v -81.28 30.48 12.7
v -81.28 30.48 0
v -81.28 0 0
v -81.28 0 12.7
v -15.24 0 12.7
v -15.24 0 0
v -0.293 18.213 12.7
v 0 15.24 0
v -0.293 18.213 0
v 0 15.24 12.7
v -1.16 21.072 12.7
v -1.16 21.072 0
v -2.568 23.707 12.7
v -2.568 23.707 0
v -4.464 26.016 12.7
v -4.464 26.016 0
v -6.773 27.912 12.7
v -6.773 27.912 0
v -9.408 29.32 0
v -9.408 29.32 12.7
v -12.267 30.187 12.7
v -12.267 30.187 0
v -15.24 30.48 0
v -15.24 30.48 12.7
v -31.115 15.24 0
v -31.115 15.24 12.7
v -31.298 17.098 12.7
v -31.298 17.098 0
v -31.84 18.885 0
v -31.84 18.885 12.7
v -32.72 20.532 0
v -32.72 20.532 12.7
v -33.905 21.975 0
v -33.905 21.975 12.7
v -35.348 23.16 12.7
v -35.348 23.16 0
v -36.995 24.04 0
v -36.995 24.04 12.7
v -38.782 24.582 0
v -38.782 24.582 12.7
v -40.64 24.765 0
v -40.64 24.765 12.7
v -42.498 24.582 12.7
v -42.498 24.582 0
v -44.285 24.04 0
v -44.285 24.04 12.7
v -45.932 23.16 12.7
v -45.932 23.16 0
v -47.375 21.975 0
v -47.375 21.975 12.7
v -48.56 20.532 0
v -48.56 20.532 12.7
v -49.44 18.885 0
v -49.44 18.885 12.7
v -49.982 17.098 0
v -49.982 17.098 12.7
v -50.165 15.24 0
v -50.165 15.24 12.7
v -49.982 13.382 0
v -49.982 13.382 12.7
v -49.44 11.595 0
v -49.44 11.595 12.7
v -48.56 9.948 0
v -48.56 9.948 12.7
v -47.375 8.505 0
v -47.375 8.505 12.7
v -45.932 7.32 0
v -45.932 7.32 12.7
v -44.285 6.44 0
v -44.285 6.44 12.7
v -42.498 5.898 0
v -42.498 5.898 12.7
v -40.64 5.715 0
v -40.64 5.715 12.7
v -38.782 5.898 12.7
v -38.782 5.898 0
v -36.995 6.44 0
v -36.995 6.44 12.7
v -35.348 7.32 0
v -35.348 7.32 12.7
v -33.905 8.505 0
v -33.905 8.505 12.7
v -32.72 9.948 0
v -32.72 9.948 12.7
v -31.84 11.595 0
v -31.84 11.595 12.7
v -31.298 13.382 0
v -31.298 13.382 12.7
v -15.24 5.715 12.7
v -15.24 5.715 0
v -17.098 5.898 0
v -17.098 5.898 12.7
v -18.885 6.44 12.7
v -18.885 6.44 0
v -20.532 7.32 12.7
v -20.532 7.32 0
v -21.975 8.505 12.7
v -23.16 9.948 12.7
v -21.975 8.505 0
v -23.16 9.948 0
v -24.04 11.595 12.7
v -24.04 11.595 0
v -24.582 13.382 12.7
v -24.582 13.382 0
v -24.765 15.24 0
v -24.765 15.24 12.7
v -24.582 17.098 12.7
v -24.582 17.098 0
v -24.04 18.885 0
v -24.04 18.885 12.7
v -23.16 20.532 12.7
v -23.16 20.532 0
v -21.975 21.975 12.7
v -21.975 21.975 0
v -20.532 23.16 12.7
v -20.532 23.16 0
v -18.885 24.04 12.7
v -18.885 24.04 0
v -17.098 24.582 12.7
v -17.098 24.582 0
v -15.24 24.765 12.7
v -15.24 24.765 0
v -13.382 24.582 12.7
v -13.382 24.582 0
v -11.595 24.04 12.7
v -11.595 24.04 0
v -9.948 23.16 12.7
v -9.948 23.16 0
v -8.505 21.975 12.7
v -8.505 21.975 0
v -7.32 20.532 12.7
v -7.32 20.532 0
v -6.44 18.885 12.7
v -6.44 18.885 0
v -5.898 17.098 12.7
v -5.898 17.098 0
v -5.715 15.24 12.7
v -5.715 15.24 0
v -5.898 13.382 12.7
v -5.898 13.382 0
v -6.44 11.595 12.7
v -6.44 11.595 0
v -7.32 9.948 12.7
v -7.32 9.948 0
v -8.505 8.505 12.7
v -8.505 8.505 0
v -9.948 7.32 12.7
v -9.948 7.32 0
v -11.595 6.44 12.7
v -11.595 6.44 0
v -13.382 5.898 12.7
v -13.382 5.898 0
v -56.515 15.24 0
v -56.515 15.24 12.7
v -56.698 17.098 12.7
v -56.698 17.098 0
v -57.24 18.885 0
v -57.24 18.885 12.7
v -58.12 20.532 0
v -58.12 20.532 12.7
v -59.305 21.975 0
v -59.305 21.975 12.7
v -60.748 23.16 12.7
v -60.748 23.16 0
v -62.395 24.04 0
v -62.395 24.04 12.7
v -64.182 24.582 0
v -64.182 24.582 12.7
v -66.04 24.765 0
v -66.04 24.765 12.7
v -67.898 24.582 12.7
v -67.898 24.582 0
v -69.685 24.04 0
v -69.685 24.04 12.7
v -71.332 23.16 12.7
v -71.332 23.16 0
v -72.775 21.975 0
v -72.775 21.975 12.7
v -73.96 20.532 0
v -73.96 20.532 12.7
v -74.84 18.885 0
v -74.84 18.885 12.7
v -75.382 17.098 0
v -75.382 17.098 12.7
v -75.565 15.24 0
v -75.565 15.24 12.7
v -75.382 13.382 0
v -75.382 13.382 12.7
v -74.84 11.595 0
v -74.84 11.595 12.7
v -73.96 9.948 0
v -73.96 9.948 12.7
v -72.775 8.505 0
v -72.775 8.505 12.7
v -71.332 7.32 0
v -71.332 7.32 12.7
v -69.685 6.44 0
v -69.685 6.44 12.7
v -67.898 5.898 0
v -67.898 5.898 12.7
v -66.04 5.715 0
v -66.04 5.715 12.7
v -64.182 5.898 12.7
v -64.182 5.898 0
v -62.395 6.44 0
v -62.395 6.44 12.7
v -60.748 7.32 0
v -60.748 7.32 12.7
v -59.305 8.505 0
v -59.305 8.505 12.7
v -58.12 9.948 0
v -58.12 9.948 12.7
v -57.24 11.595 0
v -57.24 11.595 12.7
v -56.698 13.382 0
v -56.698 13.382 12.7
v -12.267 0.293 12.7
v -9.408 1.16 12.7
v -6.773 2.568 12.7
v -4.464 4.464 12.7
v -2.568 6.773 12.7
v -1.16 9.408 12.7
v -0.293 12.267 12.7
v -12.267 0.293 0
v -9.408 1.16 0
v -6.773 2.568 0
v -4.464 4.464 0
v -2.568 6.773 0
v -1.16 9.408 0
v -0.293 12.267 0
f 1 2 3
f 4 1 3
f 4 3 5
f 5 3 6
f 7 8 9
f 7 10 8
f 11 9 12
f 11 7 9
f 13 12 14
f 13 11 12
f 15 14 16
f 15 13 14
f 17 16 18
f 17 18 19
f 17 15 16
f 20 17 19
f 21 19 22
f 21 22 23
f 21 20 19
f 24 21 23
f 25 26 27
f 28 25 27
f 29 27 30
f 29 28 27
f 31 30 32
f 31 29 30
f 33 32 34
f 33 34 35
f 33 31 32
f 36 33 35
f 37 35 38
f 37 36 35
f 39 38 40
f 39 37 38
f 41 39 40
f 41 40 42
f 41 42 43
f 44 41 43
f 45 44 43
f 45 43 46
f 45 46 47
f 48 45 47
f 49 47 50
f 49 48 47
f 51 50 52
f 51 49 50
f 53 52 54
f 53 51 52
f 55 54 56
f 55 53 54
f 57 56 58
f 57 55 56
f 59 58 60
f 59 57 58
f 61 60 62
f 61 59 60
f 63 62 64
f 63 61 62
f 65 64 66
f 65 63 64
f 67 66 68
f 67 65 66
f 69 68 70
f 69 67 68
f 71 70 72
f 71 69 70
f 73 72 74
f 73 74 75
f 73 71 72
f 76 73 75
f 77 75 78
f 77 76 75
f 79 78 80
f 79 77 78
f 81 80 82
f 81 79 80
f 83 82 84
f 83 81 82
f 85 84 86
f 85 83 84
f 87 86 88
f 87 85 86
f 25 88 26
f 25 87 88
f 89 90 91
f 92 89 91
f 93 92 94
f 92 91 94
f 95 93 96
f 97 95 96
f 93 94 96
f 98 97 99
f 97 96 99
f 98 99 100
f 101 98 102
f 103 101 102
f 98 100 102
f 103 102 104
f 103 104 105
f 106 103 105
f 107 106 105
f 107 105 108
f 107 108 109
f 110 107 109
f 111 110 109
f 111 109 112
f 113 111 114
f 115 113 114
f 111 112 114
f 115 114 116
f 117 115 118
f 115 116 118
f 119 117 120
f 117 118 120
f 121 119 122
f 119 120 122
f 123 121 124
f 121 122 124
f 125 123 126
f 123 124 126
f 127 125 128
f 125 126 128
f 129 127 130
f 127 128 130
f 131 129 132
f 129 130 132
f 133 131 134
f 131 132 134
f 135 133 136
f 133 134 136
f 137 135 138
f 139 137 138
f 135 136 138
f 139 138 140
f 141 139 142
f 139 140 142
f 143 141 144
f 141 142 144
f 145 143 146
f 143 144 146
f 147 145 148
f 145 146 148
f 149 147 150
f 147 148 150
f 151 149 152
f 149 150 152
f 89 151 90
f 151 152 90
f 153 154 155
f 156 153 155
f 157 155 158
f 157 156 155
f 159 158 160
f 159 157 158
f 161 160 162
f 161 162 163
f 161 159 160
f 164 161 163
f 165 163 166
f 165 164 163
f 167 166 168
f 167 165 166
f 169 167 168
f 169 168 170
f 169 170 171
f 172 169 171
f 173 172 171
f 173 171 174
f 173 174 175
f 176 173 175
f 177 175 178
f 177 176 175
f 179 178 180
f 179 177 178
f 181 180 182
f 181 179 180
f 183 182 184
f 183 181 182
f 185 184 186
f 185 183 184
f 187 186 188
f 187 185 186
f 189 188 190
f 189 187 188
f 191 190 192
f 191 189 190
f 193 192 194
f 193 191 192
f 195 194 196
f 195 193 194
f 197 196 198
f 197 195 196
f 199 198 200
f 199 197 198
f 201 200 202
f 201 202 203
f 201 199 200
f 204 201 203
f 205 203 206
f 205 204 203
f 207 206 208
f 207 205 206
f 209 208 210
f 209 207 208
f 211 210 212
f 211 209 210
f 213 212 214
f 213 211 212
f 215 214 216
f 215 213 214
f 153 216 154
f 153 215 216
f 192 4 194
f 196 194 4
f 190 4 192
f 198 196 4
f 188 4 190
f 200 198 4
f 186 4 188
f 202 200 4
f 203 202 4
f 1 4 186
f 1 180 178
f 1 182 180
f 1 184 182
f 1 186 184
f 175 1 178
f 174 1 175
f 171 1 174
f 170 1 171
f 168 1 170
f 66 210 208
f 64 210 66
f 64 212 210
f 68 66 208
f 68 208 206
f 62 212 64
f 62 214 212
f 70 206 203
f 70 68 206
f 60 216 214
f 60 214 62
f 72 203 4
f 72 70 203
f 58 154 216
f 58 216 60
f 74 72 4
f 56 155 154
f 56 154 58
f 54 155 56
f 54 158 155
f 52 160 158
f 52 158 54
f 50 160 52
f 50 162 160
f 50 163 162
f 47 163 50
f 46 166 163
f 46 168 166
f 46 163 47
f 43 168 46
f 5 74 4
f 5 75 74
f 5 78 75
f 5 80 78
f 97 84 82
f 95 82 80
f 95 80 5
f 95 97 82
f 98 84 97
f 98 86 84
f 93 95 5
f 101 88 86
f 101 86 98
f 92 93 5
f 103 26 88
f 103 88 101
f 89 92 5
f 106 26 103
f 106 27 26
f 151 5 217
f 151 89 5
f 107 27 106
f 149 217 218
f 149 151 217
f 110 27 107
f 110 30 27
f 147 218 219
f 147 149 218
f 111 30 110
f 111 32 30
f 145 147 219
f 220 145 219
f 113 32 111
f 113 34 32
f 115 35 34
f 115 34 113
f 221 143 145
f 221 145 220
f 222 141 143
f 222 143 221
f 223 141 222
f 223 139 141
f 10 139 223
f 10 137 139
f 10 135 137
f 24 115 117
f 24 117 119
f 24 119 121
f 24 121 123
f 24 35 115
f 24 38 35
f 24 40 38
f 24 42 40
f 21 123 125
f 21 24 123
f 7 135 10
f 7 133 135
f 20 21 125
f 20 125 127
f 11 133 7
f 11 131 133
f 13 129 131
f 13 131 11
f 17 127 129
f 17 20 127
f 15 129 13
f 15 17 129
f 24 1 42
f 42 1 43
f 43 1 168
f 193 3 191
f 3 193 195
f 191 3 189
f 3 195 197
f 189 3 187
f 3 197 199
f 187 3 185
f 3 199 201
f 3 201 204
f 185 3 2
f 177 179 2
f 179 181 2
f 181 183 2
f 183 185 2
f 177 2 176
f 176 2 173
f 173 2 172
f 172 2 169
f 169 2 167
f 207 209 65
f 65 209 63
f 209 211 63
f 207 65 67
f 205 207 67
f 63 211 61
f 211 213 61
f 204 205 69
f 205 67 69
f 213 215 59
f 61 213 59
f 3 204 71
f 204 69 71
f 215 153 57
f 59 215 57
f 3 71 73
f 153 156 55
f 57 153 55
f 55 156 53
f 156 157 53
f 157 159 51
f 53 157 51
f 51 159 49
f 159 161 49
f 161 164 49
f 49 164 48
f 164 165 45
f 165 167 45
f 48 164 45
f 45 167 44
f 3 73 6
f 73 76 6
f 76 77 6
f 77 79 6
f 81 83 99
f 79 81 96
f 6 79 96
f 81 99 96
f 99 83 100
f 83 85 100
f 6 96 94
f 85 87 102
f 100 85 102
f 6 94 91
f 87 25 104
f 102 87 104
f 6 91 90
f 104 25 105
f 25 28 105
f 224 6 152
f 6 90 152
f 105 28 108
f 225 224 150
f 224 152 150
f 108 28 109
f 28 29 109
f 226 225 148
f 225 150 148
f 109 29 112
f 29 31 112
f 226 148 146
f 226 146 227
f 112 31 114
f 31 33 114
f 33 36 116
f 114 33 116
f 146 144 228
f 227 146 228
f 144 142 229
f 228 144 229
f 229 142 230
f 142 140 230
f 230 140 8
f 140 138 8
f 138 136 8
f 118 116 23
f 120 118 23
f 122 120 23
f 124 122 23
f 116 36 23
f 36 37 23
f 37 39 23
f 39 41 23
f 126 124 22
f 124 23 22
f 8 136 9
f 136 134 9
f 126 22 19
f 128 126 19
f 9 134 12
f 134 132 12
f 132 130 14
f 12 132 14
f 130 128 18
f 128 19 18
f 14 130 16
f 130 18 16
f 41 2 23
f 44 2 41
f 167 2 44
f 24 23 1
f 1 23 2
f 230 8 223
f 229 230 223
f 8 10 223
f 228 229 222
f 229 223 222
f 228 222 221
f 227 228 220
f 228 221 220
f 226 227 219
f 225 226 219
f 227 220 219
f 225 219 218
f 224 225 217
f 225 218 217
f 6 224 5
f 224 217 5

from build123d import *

# Parameters (mm, degrees)
F0_R     = 9.525
F1_DEPTH = 12.7
F2_R     = 15.23999


# Not quite as in the source:
# - a fillet or chamfer is up to 0.001 mm smaller than in the source, because OpenCascade refuses the exact size


with BuildPart() as f1:
    # F0 (on Top) → F1 (new body)
    with BuildSketch(Plane.XY):
        Polygon((-15.24, 0), (0, 0), (0, 30.48), (-81.28, 30.48), (-81.28, 0), align=None)
        with Locations((-66.04, 15.24)):
            Circle(F0_R, mode=Mode.SUBTRACT)
        with Locations((-40.64, 15.24)):
            Circle(F0_R, mode=Mode.SUBTRACT)
        with BuildLine():
            ThreePointArc((-5.715, 15.24), (-8.5048079092, 8.5048079092), (-15.24, 5.715))
            ThreePointArc((-15.24, 5.715), (-21.9751920908, 21.9751920908), (-5.715, 15.24))
        make_face(mode=Mode.SUBTRACT)
    extrude(amount=F1_DEPTH)

    # F2 (radius 15.24 in the source; OpenCascade refuses exactly that, so slightly less here)
    f2_edges = [f1.edges().sort_by_distance(p)[0] for p in [
        (0, 0, 6.35),
        (0, 30.48, 6.35),
    ]]
    fillet(f2_edges, radius=F2_R)


solid = f1.part
